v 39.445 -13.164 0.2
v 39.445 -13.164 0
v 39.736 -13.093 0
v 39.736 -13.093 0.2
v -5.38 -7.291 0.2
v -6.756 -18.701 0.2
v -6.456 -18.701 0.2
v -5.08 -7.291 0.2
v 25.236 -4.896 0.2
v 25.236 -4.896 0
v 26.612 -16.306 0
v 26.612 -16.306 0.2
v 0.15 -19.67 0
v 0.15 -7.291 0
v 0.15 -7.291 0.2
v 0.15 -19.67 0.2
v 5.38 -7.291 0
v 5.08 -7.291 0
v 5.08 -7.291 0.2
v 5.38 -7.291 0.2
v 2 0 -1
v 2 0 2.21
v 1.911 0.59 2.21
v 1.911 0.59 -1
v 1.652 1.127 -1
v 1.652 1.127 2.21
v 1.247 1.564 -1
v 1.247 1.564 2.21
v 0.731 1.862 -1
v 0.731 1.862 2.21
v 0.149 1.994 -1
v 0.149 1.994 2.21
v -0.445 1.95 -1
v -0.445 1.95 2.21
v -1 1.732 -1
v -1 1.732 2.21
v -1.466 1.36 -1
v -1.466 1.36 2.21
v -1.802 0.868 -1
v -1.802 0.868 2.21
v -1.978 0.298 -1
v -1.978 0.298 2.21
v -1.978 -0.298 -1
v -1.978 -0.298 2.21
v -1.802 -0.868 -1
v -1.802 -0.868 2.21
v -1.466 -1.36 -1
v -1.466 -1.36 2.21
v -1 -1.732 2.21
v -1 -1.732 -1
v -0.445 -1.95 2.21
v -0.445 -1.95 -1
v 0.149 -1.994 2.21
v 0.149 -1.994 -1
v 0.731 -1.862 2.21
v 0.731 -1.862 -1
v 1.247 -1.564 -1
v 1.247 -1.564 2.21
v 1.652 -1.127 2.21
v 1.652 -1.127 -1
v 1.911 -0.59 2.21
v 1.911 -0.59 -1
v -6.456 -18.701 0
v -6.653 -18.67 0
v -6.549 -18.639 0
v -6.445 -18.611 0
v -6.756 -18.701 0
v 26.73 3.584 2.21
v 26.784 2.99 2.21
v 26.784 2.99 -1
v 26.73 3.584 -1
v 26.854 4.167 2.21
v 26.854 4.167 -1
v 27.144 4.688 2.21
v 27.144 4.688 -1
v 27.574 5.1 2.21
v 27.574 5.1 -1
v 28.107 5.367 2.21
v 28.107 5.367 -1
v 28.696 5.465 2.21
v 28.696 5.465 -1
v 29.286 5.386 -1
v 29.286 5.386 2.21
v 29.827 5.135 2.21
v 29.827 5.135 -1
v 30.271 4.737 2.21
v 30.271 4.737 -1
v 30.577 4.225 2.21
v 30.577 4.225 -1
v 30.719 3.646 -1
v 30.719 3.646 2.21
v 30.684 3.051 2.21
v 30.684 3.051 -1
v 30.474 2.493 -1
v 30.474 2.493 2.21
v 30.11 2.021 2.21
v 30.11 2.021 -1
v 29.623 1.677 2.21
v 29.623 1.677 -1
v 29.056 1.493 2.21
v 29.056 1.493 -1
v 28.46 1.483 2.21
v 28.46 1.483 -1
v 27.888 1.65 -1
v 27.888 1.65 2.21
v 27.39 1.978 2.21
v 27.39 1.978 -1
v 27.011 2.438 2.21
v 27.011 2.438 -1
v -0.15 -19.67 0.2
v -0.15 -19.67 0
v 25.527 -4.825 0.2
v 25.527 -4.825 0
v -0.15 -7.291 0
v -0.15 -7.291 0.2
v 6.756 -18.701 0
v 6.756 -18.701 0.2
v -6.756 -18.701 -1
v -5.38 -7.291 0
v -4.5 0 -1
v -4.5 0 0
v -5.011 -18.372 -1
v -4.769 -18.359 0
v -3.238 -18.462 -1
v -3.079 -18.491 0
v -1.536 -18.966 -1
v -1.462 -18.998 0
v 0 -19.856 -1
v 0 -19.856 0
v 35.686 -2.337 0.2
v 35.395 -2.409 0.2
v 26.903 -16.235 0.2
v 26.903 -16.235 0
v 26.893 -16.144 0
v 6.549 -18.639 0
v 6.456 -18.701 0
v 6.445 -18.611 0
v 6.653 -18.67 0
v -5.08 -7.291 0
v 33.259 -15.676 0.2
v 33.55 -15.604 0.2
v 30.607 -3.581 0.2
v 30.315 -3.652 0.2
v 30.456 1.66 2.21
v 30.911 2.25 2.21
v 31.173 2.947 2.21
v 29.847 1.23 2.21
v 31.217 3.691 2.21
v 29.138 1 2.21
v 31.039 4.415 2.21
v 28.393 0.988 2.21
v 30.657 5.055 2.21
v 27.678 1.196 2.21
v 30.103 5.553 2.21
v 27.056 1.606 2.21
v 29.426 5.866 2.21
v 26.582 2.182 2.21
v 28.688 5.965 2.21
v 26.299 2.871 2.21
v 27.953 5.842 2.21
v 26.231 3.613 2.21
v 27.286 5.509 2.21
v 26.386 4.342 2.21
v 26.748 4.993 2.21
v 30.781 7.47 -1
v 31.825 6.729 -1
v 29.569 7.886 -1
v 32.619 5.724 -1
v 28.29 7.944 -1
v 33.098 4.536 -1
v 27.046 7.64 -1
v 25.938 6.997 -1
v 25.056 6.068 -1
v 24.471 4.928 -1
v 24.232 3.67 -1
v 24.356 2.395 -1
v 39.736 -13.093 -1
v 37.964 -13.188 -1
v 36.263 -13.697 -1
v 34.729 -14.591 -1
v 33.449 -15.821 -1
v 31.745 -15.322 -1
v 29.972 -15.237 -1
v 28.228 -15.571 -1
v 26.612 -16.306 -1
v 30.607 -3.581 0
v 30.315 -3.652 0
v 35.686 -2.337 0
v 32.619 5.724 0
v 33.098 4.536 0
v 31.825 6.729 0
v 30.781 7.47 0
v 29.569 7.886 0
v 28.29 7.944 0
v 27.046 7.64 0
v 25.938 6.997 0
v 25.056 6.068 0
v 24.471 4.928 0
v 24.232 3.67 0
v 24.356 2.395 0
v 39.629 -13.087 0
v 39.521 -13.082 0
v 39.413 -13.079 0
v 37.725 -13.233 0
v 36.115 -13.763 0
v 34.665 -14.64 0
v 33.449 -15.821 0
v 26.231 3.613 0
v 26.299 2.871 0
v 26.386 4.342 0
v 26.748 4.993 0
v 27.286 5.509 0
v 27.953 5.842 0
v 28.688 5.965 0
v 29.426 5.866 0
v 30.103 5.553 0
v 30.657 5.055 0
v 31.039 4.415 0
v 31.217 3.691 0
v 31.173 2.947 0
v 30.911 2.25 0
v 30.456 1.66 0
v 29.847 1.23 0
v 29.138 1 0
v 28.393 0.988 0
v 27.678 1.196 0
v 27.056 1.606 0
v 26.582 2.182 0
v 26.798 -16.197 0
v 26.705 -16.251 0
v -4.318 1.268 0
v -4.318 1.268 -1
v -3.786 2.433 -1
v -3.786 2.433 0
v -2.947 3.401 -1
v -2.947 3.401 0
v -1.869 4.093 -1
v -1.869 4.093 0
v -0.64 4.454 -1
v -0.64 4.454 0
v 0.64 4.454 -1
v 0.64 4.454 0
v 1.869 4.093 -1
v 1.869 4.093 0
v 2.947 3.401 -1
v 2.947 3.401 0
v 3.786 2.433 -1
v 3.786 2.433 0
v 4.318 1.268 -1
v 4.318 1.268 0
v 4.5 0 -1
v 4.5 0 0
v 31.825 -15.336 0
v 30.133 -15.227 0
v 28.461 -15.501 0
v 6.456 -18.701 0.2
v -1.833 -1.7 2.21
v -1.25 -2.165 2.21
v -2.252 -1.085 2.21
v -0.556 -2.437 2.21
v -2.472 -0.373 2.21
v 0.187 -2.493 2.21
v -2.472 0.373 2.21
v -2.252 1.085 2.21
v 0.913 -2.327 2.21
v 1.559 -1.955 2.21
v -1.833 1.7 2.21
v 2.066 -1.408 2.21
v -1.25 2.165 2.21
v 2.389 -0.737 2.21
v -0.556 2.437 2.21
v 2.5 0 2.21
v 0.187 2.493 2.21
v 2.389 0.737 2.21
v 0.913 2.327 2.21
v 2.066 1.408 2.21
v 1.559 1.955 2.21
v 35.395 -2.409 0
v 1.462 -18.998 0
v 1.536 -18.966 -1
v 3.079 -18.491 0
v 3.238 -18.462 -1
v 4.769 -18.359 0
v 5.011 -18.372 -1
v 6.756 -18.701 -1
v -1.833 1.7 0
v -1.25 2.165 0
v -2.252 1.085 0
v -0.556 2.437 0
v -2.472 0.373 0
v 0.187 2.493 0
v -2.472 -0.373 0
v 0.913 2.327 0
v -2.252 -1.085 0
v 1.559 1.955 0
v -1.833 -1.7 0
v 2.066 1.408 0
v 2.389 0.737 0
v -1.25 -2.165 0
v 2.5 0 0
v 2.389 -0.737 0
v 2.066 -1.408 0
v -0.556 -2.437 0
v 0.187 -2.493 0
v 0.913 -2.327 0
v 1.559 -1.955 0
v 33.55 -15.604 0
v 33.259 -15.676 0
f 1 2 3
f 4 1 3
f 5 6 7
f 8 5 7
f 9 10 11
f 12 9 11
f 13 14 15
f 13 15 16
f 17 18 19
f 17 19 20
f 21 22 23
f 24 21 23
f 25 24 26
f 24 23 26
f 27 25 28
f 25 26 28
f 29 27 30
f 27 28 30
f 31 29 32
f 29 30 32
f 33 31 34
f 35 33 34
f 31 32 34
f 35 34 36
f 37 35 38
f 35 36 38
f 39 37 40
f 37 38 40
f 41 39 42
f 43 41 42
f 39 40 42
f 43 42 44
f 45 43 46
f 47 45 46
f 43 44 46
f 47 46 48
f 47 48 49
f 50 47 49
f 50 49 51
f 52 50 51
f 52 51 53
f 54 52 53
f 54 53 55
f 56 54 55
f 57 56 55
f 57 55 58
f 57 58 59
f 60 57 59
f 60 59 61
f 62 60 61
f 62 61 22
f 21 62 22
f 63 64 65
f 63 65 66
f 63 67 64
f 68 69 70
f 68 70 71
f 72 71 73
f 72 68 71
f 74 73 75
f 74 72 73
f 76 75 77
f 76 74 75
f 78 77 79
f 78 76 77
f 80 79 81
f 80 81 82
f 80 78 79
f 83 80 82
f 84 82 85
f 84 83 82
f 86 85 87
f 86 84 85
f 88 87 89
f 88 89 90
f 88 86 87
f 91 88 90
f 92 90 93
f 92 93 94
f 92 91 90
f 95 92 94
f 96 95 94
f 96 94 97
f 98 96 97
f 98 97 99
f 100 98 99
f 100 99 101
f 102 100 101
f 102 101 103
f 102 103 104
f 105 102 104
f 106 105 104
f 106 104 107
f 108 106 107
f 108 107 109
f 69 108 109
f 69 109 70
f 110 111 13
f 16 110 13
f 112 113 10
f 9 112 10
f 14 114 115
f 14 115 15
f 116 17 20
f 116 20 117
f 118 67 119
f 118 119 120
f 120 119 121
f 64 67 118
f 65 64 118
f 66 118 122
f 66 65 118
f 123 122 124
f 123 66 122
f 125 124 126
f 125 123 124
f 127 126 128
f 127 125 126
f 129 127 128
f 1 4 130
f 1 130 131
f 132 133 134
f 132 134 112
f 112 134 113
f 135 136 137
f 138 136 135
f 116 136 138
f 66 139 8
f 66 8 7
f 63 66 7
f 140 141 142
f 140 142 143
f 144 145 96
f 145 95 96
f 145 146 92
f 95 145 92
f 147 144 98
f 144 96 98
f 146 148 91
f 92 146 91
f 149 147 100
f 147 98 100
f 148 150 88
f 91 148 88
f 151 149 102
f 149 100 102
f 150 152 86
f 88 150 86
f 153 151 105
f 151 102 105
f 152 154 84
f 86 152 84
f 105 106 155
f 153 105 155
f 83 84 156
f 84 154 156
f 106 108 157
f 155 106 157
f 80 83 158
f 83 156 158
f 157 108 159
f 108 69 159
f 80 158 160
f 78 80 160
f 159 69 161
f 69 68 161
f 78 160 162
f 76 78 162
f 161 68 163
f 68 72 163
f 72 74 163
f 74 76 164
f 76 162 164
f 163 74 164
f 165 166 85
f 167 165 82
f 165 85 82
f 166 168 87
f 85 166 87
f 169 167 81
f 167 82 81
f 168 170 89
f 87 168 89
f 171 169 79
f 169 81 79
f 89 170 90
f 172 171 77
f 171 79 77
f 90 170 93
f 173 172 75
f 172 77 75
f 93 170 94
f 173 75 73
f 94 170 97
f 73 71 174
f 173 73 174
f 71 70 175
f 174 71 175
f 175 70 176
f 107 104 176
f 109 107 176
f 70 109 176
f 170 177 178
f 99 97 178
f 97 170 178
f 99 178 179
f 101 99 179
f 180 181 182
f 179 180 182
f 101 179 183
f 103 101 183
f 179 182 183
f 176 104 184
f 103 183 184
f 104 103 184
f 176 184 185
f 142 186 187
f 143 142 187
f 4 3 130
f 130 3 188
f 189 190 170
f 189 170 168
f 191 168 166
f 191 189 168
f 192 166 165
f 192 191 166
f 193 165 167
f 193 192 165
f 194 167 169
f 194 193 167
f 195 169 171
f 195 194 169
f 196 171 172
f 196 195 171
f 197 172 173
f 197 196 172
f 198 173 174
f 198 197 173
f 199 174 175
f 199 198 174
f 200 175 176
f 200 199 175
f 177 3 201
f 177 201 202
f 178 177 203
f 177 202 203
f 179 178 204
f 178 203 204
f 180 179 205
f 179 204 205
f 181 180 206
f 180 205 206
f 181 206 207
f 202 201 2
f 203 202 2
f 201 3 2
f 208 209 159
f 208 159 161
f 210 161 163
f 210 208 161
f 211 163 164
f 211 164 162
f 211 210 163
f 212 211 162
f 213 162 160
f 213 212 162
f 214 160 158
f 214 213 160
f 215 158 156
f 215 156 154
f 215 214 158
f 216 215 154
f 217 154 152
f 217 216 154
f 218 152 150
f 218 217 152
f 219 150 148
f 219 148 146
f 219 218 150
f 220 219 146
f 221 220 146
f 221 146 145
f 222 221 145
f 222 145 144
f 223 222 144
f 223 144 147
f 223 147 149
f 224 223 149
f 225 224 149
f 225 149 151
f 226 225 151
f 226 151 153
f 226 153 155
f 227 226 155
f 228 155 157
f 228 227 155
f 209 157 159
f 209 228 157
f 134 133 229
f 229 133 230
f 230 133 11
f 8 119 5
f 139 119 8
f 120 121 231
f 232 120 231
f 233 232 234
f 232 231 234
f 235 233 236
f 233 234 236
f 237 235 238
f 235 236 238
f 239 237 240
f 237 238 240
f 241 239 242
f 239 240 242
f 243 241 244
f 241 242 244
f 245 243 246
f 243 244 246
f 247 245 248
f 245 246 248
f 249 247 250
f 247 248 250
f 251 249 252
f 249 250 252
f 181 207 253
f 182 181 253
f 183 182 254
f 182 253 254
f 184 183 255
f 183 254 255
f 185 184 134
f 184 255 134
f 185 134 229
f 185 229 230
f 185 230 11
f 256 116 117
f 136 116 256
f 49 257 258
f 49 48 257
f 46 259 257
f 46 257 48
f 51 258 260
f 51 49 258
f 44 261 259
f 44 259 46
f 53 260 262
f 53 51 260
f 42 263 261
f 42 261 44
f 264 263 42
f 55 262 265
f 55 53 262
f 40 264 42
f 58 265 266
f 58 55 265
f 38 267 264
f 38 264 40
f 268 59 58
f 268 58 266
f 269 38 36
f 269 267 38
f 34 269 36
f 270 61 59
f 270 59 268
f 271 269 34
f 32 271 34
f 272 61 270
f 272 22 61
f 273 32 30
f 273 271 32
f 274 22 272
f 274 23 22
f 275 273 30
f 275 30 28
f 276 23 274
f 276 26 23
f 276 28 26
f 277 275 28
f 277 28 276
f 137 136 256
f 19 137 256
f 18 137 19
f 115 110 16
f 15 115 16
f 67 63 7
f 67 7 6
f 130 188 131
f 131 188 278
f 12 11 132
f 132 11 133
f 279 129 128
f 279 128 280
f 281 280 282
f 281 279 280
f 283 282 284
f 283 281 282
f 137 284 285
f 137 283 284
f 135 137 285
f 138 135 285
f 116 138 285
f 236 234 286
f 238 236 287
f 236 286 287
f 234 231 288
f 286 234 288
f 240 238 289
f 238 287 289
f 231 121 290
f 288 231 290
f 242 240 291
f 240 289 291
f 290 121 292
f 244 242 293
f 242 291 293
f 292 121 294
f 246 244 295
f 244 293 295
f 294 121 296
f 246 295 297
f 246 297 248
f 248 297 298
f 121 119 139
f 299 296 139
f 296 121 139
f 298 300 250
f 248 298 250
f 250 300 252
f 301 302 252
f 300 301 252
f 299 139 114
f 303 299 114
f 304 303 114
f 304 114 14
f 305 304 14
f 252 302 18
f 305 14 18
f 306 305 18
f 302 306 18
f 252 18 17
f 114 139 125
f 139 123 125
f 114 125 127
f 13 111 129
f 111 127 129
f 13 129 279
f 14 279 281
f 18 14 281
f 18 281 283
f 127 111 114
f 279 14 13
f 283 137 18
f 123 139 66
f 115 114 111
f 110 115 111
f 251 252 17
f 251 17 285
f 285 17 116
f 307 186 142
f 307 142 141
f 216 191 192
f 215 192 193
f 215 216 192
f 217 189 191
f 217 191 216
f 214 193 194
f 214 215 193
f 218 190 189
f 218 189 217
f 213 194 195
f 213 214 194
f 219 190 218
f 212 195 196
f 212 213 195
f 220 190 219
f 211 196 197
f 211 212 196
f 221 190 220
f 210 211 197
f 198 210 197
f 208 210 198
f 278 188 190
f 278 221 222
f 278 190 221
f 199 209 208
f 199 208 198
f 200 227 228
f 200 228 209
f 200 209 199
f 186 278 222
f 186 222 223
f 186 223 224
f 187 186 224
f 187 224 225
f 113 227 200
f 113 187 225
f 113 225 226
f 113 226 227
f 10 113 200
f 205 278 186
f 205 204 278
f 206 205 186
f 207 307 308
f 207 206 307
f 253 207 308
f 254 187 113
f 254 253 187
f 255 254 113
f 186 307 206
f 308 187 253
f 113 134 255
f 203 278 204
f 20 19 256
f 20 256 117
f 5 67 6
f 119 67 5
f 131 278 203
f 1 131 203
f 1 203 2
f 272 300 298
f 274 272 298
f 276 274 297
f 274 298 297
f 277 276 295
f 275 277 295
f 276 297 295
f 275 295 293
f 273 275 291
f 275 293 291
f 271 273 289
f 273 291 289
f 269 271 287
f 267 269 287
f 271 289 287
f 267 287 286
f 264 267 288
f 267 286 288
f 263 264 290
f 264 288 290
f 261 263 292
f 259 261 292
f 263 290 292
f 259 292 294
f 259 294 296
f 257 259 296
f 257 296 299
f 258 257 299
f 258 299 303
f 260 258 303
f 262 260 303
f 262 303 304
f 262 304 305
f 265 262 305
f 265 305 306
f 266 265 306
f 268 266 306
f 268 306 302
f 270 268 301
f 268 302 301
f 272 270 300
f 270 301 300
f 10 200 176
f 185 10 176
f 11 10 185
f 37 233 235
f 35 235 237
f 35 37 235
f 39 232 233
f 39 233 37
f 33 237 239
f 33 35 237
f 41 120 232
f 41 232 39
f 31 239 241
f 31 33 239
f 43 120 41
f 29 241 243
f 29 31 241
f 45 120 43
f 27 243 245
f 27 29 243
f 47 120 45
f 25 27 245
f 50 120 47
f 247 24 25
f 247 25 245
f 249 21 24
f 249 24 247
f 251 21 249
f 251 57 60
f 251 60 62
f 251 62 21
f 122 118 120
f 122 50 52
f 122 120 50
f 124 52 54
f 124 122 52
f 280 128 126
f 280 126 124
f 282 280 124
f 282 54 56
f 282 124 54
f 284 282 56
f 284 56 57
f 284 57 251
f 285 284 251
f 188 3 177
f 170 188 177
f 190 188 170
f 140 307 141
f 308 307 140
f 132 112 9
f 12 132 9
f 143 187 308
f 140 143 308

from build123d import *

# Parameters (mm, degrees)
F0_R     = 2.5
F1_DEPTH = 2.21
F3_DEPTH = 1
F4_R     = 2
F5_DEPTH = 25
F7_DEPTH = 25
F8_W     = 0.3
F8_H     = 12.378456
F9_DEPTH = 0.2


with BuildPart() as f1:
    # F0 (on Top) → F1 (new body)
    with BuildSketch(Plane.XY):
        Circle(F0_R)
    extrude(amount=F1_DEPTH)

    # F2 (on face) → F3 (join)
    with BuildSketch(Plane(origin=(0, 0, 0), x_dir=(1, 0, 0), z_dir=(0, 0, -1))):
        with BuildLine():
            ThreePointArc((-4.5, 0), (0, -4.5), (4.5, 0))
            ThreePointArc((4.5, 0), (0, 4.5), (-4.5, 0))
        make_face()
        with BuildLine():
            ThreePointArc((-4.5, 0), (0, 4.5), (4.5, 0))
            Line((4.5, 0), (6.895295, 19.856046))
            Line((6.895295, 19.856046), (-6.895295, 19.856046))
            Line((-6.895295, 19.856046), (-4.5, 0))
        make_face()
    extrude(amount=F3_DEPTH)

    # F4 (on face) → F5 (cut)
    with BuildSketch(Plane.XY.offset(2.21)):
        Circle(F4_R)
    extrude(amount=-F5_DEPTH, mode=Mode.SUBTRACT)

    # F6 (on face) → F7 (cut)
    with BuildSketch(Plane(origin=(0, 0, 0), x_dir=(1, 0, 0), z_dir=(0, 0, -1))):
        with BuildLine():
            ThreePointArc((0, 31.853238), (2.206856, 29.207698), (2.998129, 25.854642))
            ThreePointArc((2.998129, 25.854642), (2.206856, 22.501586), (0, 19.856046))
            ThreePointArc((0, 19.856046), (7.854927, 19.145915), (12.001871, 25.854642))
            ThreePointArc((12.001871, 25.854642), (7.854927, 32.563369), (0, 31.853238))
        make_face()
        with BuildLine():
            ThreePointArc((0, 19.856046), (-2.998129, 25.854642), (0, 31.853238))
            ThreePointArc((0, 31.853238), (-12.001871, 25.854642), (0, 19.856046))
        make_face()
    extrude(amount=F7_DEPTH, mode=Mode.SUBTRACT)

    # F8 (on face) → F9 (join)
    with BuildSketch(Plane(origin=(0, 0, 0), x_dir=(1, 0, 0), z_dir=(0, 0, -1))):
        Polygon((-6.756007, 18.7014), (-5.37956, 7.2912), (-5.07956, 7.2912), (-6.456007, 18.7014), align=None)
        Polygon((5.07956, 7.2912), (5.37956, 7.2912), (6.756007, 18.7014), (6.456007, 18.7014), align=None)
        with Locations((0, 13.480428)):
            Rectangle(F8_W, F8_H)
    extrude(amount=-F9_DEPTH)


with BuildPart() as f11_1:
    # F11: instance of F1
    add(f1.part.mirror(Plane(origin=(15.603854, -8.549527, -0.434747), x_dir=(-0.119765, 0.992802, 0), z_dir=(0.992802, 0.119765, 0))))


solid = Compound([f1.part, f11_1.part])
